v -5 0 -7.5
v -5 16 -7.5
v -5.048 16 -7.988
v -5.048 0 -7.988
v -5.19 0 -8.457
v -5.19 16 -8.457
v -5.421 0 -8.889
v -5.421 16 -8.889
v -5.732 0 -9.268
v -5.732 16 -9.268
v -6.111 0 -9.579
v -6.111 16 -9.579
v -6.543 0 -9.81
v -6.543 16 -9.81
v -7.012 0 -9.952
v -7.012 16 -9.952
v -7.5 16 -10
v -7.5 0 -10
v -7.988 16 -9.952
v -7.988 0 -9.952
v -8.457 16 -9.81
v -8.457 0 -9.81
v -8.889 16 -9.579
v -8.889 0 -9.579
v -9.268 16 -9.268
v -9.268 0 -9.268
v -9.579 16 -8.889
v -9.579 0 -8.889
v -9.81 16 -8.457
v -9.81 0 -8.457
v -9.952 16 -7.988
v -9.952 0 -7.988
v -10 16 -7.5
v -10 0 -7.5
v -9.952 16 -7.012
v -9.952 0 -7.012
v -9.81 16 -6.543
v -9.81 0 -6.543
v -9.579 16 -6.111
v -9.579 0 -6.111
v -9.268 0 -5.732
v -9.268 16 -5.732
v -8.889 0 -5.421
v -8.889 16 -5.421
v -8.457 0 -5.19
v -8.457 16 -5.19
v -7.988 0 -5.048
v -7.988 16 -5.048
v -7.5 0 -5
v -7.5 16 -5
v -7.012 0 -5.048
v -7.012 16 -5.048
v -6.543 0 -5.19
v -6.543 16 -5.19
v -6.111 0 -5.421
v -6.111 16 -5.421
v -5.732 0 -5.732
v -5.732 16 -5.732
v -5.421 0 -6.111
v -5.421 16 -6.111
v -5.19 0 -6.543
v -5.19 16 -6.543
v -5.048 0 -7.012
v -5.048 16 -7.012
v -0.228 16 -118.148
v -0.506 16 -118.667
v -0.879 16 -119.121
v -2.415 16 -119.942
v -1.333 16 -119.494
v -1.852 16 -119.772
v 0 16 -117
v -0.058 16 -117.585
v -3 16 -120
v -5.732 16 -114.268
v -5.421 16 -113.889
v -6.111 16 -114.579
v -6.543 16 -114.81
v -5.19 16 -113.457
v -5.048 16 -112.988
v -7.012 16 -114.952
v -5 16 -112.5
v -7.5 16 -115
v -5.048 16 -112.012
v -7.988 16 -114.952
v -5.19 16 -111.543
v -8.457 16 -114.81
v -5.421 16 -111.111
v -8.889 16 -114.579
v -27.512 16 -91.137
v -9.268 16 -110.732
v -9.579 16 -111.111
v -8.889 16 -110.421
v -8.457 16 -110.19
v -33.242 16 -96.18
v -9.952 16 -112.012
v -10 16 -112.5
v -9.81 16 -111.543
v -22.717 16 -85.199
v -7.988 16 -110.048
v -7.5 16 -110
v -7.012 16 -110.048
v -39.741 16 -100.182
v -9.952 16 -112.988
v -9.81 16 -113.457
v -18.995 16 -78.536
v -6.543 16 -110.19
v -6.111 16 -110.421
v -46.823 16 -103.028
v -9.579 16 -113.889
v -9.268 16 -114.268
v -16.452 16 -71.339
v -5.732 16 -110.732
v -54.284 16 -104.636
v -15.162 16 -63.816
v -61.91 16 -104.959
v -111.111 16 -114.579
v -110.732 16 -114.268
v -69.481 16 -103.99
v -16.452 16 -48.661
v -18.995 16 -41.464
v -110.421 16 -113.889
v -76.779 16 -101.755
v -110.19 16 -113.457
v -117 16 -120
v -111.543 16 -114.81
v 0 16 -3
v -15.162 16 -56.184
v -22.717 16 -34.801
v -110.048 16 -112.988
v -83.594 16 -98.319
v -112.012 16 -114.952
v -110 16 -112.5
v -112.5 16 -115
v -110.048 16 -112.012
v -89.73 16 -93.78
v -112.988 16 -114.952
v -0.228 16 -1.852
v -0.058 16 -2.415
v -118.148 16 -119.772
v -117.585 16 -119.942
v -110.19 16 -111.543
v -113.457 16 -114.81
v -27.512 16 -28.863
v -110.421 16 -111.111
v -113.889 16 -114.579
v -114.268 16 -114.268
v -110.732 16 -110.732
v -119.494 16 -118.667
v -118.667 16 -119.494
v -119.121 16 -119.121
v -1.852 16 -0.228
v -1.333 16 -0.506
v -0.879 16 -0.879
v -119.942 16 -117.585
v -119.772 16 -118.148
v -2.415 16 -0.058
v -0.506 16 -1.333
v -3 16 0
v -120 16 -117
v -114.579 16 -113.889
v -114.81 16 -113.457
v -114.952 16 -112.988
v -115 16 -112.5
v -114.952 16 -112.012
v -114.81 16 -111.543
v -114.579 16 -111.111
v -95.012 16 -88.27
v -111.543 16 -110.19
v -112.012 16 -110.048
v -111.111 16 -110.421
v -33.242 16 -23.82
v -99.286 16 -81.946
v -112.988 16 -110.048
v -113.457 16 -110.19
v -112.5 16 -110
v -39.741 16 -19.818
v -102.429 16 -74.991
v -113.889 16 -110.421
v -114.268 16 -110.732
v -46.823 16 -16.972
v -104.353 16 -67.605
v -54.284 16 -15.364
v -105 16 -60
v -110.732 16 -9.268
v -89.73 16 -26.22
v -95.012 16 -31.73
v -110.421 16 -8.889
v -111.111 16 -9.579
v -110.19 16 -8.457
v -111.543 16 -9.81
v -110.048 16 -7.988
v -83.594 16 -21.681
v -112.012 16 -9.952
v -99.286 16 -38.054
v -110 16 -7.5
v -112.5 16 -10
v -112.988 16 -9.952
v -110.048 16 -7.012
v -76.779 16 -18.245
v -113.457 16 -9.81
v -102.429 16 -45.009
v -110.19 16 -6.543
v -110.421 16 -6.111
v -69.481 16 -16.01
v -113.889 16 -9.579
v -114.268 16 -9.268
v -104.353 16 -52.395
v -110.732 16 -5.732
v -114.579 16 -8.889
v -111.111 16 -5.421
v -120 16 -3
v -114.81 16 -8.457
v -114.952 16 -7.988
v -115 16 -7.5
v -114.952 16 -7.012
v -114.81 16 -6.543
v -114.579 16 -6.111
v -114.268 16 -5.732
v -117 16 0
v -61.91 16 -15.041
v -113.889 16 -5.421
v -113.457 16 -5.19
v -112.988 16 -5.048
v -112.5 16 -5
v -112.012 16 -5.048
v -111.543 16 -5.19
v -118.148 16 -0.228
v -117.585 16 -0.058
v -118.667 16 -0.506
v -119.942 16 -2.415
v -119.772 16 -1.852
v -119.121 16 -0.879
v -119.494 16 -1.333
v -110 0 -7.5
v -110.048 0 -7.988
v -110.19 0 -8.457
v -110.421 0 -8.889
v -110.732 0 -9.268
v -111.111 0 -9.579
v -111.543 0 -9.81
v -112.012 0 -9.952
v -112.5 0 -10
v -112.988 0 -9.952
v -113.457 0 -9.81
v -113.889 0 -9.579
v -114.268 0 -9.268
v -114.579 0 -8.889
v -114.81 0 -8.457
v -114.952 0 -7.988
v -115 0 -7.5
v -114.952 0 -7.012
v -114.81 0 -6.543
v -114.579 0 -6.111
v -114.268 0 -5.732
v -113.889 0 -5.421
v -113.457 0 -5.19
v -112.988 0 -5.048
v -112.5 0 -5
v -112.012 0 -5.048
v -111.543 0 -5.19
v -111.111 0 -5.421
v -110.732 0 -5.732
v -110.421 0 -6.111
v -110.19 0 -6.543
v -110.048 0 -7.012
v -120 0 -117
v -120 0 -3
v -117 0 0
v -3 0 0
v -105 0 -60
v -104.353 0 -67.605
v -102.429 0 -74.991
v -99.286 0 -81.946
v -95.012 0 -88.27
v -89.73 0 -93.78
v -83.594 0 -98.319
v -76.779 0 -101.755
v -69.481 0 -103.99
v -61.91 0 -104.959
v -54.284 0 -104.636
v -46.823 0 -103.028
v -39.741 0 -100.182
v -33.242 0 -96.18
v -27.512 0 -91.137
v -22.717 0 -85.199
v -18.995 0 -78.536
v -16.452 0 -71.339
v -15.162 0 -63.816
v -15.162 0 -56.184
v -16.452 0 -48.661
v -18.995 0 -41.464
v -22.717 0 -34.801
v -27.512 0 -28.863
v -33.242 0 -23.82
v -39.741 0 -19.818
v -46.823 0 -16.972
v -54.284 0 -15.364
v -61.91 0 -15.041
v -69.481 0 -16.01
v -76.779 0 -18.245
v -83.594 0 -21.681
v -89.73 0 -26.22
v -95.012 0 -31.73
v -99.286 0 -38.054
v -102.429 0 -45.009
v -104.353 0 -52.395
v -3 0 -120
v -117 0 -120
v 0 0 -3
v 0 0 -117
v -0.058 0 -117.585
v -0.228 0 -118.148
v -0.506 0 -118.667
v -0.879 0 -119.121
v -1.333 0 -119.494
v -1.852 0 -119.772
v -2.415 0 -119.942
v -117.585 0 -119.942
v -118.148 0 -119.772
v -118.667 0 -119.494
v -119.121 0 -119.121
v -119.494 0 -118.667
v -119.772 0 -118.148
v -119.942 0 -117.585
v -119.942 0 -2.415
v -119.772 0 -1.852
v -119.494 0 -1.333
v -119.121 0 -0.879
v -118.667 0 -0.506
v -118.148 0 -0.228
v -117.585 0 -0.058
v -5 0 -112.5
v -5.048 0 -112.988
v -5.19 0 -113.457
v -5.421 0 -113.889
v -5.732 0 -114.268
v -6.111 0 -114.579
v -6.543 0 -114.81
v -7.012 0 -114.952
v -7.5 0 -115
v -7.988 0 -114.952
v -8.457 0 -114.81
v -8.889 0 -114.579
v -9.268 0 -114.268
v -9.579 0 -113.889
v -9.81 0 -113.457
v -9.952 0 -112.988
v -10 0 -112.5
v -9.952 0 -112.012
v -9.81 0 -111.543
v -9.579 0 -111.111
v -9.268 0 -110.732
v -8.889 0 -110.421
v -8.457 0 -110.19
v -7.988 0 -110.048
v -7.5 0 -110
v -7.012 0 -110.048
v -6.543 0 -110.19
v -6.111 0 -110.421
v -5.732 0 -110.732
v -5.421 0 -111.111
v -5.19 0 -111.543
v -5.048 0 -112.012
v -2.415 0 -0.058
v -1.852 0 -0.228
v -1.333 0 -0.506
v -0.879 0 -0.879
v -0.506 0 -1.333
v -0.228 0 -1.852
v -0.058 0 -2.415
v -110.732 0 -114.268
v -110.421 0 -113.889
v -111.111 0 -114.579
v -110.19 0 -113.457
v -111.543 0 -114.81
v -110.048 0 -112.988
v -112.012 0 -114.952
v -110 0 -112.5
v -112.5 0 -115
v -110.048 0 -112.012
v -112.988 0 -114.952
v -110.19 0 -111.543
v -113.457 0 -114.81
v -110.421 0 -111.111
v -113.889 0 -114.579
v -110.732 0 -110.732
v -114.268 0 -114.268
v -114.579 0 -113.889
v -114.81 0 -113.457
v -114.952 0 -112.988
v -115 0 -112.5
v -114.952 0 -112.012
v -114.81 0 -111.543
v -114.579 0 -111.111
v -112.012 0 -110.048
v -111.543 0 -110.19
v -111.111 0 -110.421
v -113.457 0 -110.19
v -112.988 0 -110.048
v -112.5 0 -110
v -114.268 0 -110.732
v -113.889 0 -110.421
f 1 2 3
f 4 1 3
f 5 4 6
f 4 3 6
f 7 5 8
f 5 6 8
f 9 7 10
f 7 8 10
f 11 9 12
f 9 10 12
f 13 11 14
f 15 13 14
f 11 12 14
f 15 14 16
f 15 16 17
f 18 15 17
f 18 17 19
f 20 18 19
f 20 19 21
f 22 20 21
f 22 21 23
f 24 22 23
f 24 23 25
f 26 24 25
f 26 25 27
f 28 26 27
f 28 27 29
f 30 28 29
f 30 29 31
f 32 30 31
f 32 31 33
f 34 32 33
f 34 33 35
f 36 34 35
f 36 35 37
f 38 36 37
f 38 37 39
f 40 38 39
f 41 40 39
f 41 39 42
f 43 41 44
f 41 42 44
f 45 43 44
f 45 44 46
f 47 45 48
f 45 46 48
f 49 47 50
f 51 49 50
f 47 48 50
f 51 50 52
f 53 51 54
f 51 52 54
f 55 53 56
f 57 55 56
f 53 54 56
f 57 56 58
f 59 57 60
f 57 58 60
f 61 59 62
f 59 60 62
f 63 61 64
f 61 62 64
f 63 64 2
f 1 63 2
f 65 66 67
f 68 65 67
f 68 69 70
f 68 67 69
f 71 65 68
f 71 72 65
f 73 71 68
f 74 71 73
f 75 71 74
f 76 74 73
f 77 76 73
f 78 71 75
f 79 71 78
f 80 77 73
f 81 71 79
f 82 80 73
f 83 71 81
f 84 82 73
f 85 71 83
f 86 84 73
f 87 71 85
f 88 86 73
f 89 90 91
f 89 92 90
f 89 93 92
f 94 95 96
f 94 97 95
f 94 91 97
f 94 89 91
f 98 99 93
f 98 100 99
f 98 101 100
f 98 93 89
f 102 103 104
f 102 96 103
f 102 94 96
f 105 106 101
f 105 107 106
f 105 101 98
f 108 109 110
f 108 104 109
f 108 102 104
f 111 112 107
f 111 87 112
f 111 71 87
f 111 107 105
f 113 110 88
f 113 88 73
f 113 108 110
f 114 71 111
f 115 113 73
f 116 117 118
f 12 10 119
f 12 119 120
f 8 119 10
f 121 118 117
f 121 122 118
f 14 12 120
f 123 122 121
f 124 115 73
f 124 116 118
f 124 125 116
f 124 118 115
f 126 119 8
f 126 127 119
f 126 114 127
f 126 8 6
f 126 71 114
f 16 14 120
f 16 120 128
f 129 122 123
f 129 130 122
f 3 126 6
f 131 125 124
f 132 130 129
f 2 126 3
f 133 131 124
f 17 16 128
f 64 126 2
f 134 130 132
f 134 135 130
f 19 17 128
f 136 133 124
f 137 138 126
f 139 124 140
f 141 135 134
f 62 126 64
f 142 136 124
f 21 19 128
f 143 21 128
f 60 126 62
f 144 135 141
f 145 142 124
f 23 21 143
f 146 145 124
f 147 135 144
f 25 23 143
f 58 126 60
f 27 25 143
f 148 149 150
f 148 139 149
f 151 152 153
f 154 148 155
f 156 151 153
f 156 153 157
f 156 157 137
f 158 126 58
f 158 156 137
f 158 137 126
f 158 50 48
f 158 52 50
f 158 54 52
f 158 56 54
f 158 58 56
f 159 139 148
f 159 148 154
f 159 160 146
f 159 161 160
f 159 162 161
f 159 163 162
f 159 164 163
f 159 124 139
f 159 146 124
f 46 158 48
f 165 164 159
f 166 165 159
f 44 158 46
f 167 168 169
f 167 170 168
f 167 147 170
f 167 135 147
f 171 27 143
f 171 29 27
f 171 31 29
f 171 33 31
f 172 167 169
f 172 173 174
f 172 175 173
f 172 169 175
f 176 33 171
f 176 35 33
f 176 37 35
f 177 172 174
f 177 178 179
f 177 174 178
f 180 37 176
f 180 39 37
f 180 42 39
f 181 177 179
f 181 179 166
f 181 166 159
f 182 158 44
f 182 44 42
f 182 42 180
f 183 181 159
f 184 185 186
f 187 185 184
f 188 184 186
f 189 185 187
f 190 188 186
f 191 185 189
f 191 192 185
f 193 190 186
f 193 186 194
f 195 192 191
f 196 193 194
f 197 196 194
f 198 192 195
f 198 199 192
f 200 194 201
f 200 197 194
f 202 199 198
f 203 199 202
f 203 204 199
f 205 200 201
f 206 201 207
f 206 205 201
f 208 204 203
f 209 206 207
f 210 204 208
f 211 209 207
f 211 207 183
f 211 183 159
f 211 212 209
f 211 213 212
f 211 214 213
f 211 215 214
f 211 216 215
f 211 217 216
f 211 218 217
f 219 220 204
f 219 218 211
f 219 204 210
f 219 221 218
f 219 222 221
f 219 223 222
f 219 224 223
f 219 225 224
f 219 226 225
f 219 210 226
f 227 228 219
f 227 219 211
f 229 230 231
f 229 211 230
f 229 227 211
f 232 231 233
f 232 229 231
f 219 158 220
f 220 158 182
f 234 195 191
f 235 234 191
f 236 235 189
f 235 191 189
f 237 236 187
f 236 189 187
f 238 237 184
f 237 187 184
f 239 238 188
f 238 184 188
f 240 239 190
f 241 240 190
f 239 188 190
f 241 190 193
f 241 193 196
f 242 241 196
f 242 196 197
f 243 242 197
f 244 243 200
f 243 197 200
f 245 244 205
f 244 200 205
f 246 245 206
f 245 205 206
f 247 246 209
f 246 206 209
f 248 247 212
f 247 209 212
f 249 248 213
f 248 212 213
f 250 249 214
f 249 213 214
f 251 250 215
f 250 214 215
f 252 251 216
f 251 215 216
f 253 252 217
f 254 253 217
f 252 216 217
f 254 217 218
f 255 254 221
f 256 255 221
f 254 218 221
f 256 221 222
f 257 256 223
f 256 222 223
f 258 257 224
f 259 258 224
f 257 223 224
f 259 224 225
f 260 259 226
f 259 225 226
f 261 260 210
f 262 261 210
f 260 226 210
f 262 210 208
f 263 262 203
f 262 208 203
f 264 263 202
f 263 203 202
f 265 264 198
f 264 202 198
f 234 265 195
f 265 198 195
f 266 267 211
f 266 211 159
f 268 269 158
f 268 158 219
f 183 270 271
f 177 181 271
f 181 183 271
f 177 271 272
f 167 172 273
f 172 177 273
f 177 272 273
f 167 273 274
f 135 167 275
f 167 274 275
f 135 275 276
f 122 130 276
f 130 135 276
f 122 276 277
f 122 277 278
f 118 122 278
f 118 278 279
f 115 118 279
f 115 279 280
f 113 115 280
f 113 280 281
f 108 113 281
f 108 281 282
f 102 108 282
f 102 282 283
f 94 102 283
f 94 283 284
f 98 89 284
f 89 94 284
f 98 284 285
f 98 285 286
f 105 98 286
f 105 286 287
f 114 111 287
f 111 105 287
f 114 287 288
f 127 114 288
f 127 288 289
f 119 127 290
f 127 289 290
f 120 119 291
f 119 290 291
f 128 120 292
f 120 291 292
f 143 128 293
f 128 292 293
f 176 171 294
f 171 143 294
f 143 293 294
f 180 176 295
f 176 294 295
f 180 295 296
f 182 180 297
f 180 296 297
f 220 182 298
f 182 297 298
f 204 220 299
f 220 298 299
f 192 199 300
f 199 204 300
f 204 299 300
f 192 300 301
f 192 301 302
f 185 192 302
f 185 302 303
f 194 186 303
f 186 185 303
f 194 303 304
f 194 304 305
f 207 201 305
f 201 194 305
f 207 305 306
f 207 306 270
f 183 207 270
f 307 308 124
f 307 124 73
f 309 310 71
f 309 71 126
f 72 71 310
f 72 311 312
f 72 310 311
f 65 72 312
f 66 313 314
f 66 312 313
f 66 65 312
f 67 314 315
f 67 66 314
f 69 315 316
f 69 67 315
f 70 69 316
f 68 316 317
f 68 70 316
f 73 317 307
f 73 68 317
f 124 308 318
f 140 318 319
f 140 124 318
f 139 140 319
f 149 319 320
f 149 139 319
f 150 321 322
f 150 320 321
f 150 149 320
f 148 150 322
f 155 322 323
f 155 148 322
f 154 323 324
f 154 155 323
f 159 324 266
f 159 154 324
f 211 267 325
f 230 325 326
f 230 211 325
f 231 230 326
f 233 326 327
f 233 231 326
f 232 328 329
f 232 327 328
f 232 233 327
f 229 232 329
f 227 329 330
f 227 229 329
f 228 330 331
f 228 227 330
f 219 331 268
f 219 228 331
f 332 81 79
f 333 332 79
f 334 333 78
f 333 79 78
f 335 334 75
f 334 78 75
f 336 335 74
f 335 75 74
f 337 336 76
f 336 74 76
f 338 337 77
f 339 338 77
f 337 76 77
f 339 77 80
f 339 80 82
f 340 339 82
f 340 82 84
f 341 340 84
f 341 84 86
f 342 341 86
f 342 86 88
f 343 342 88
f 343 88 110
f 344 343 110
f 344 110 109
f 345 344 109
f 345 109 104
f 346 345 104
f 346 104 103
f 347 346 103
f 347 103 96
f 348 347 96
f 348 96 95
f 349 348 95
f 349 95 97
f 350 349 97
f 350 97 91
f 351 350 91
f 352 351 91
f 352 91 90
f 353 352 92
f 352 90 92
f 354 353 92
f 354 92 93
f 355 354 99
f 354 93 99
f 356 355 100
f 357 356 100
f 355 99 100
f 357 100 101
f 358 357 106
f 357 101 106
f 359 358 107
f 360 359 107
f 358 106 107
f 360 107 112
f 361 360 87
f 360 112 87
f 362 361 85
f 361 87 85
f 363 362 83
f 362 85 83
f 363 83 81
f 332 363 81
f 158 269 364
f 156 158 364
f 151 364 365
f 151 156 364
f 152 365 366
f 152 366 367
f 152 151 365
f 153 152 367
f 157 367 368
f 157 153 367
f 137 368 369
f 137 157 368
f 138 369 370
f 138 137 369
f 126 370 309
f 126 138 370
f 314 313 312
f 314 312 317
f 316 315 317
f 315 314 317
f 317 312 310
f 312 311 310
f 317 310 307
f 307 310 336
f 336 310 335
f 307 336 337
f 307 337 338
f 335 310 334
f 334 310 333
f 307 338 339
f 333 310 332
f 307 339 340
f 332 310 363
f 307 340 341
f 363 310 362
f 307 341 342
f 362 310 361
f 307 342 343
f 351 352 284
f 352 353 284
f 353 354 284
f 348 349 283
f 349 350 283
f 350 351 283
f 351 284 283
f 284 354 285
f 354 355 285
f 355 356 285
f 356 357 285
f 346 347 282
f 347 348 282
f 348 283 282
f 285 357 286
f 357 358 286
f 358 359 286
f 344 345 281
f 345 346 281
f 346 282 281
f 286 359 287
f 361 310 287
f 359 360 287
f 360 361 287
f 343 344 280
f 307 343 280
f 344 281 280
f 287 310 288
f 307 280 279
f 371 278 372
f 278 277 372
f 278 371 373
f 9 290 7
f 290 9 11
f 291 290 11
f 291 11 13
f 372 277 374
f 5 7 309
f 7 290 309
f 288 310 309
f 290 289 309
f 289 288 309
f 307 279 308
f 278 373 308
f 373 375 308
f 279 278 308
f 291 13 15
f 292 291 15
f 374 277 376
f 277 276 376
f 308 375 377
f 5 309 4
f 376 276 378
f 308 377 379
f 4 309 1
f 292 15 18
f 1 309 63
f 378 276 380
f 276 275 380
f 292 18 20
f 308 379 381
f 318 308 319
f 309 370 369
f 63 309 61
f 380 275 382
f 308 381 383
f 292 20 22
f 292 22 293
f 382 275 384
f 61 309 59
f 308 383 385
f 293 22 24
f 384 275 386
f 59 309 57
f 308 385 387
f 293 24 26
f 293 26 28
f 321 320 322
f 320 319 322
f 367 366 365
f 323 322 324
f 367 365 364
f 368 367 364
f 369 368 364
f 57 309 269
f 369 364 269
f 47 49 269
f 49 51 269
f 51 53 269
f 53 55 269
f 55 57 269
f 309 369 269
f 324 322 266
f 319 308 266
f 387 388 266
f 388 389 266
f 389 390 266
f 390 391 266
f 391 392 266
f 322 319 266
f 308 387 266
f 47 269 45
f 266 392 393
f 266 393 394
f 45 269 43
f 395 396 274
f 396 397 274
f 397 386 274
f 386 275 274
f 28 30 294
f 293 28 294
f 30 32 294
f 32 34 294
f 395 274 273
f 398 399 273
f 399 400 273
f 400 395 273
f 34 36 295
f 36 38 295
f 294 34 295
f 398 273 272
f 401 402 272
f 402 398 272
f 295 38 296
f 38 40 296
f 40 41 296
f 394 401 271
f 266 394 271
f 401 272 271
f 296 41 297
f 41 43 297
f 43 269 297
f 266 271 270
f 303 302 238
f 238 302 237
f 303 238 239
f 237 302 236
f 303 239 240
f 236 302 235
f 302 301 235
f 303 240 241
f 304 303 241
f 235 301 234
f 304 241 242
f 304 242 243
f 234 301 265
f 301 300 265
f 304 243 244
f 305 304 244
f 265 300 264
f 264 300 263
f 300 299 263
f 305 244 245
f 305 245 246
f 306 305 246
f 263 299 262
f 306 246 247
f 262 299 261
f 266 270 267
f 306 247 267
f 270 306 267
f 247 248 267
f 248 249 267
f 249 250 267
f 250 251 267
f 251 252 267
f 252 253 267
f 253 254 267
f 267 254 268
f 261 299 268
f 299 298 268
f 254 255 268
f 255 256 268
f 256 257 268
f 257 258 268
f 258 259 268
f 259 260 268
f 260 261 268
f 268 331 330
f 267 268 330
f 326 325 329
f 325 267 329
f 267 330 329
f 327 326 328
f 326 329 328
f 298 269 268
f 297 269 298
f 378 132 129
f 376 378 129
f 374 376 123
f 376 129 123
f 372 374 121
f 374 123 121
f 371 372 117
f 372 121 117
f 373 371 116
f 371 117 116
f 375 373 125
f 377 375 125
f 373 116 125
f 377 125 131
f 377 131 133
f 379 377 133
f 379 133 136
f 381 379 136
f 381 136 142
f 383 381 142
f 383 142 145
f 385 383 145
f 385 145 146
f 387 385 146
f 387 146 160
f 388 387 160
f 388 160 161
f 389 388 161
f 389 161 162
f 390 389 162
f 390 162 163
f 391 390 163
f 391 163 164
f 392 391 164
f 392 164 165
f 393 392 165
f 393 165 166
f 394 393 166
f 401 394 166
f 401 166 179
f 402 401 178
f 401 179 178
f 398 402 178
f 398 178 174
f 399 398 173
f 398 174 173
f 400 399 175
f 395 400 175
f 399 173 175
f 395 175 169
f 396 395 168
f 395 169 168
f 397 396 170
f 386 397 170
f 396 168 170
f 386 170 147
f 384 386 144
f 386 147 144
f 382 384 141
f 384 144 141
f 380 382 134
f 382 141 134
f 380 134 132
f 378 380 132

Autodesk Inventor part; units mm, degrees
ref_plane "YZ Plane" through (0, 0, 0) normal (1, 0, 0) x (0, 1, 0)
ref_plane "XZ Plane" through (0, 0, 0) normal (0, 1, 0) x (-1, 0, 0)
ref_plane "XY Plane" through (0, 0, 0) normal (0, 0, 1) x (1, 0, 0)
sketch "Эскиз1" plane through (0, 0, 0) normal (0, 1, 0) x (-1, 0, 0)
  line L0 (0, 0) -> (120, 0)
  line L1 (120, 0) -> (120, -120)
  line L2 (120, -120) -> (0, -120)
  line L3 (0, -120) -> (0, 0)
  dimension "d0" = 120
  dimension "d1" = 120
sketch "Эскиз2" plane through (0, 0, 0) normal (0, 1, 0) x (-1, 0, 0)
  circle A0 centre (60, -60) radius 45
  point P0 (0, 0)
  dimension "d2" = 90
  dimension "d3" = 60
  dimension "d4" = 60
extrude "Выдавливание1" add sketch "Эскиз1" along normal blind 16
fillet "Сопряжение1" radius 3 4 edges at (-120, 8, 0) (0, 8, 0) (0, 8, -120) (-120, 8, -120)
extrude "Выдавливание2" cut sketch "Эскиз2" along normal blind 16
sketch "Эскиз3" plane through (0, 16, 0) normal (0, 1, 0) x (1, 0, 0)
  circle A0 centre (-112.5, 7.5) radius 2.5
  circle A1 centre (-7.5, 7.5) radius 2.5
  circle A2 centre (-7.5, 112.5) radius 2.5
  circle A3 centre (-112.5, 112.5) radius 2.5
  line L0 (0, 3) -> (0, 117) projected
  point P0 (0, 0)
  dimension "d10" = 5
  dimension "d11" = 5
  dimension "d12" = 5
  dimension "d13" = 5
  dimension "d14" = 112.5
  dimension "d15" = 7.5
  dimension "d16" = 7.5
  dimension "d17" = 7.5
  dimension "d18" = 105
  dimension "d19" = 7.5
  dimension "d20" = 105
  dimension "d21" = 105
extrude "Выдавливание3" cut sketch "Эскиз3" against normal blind 16
properties part number "NoctuaNF-A12x15"
